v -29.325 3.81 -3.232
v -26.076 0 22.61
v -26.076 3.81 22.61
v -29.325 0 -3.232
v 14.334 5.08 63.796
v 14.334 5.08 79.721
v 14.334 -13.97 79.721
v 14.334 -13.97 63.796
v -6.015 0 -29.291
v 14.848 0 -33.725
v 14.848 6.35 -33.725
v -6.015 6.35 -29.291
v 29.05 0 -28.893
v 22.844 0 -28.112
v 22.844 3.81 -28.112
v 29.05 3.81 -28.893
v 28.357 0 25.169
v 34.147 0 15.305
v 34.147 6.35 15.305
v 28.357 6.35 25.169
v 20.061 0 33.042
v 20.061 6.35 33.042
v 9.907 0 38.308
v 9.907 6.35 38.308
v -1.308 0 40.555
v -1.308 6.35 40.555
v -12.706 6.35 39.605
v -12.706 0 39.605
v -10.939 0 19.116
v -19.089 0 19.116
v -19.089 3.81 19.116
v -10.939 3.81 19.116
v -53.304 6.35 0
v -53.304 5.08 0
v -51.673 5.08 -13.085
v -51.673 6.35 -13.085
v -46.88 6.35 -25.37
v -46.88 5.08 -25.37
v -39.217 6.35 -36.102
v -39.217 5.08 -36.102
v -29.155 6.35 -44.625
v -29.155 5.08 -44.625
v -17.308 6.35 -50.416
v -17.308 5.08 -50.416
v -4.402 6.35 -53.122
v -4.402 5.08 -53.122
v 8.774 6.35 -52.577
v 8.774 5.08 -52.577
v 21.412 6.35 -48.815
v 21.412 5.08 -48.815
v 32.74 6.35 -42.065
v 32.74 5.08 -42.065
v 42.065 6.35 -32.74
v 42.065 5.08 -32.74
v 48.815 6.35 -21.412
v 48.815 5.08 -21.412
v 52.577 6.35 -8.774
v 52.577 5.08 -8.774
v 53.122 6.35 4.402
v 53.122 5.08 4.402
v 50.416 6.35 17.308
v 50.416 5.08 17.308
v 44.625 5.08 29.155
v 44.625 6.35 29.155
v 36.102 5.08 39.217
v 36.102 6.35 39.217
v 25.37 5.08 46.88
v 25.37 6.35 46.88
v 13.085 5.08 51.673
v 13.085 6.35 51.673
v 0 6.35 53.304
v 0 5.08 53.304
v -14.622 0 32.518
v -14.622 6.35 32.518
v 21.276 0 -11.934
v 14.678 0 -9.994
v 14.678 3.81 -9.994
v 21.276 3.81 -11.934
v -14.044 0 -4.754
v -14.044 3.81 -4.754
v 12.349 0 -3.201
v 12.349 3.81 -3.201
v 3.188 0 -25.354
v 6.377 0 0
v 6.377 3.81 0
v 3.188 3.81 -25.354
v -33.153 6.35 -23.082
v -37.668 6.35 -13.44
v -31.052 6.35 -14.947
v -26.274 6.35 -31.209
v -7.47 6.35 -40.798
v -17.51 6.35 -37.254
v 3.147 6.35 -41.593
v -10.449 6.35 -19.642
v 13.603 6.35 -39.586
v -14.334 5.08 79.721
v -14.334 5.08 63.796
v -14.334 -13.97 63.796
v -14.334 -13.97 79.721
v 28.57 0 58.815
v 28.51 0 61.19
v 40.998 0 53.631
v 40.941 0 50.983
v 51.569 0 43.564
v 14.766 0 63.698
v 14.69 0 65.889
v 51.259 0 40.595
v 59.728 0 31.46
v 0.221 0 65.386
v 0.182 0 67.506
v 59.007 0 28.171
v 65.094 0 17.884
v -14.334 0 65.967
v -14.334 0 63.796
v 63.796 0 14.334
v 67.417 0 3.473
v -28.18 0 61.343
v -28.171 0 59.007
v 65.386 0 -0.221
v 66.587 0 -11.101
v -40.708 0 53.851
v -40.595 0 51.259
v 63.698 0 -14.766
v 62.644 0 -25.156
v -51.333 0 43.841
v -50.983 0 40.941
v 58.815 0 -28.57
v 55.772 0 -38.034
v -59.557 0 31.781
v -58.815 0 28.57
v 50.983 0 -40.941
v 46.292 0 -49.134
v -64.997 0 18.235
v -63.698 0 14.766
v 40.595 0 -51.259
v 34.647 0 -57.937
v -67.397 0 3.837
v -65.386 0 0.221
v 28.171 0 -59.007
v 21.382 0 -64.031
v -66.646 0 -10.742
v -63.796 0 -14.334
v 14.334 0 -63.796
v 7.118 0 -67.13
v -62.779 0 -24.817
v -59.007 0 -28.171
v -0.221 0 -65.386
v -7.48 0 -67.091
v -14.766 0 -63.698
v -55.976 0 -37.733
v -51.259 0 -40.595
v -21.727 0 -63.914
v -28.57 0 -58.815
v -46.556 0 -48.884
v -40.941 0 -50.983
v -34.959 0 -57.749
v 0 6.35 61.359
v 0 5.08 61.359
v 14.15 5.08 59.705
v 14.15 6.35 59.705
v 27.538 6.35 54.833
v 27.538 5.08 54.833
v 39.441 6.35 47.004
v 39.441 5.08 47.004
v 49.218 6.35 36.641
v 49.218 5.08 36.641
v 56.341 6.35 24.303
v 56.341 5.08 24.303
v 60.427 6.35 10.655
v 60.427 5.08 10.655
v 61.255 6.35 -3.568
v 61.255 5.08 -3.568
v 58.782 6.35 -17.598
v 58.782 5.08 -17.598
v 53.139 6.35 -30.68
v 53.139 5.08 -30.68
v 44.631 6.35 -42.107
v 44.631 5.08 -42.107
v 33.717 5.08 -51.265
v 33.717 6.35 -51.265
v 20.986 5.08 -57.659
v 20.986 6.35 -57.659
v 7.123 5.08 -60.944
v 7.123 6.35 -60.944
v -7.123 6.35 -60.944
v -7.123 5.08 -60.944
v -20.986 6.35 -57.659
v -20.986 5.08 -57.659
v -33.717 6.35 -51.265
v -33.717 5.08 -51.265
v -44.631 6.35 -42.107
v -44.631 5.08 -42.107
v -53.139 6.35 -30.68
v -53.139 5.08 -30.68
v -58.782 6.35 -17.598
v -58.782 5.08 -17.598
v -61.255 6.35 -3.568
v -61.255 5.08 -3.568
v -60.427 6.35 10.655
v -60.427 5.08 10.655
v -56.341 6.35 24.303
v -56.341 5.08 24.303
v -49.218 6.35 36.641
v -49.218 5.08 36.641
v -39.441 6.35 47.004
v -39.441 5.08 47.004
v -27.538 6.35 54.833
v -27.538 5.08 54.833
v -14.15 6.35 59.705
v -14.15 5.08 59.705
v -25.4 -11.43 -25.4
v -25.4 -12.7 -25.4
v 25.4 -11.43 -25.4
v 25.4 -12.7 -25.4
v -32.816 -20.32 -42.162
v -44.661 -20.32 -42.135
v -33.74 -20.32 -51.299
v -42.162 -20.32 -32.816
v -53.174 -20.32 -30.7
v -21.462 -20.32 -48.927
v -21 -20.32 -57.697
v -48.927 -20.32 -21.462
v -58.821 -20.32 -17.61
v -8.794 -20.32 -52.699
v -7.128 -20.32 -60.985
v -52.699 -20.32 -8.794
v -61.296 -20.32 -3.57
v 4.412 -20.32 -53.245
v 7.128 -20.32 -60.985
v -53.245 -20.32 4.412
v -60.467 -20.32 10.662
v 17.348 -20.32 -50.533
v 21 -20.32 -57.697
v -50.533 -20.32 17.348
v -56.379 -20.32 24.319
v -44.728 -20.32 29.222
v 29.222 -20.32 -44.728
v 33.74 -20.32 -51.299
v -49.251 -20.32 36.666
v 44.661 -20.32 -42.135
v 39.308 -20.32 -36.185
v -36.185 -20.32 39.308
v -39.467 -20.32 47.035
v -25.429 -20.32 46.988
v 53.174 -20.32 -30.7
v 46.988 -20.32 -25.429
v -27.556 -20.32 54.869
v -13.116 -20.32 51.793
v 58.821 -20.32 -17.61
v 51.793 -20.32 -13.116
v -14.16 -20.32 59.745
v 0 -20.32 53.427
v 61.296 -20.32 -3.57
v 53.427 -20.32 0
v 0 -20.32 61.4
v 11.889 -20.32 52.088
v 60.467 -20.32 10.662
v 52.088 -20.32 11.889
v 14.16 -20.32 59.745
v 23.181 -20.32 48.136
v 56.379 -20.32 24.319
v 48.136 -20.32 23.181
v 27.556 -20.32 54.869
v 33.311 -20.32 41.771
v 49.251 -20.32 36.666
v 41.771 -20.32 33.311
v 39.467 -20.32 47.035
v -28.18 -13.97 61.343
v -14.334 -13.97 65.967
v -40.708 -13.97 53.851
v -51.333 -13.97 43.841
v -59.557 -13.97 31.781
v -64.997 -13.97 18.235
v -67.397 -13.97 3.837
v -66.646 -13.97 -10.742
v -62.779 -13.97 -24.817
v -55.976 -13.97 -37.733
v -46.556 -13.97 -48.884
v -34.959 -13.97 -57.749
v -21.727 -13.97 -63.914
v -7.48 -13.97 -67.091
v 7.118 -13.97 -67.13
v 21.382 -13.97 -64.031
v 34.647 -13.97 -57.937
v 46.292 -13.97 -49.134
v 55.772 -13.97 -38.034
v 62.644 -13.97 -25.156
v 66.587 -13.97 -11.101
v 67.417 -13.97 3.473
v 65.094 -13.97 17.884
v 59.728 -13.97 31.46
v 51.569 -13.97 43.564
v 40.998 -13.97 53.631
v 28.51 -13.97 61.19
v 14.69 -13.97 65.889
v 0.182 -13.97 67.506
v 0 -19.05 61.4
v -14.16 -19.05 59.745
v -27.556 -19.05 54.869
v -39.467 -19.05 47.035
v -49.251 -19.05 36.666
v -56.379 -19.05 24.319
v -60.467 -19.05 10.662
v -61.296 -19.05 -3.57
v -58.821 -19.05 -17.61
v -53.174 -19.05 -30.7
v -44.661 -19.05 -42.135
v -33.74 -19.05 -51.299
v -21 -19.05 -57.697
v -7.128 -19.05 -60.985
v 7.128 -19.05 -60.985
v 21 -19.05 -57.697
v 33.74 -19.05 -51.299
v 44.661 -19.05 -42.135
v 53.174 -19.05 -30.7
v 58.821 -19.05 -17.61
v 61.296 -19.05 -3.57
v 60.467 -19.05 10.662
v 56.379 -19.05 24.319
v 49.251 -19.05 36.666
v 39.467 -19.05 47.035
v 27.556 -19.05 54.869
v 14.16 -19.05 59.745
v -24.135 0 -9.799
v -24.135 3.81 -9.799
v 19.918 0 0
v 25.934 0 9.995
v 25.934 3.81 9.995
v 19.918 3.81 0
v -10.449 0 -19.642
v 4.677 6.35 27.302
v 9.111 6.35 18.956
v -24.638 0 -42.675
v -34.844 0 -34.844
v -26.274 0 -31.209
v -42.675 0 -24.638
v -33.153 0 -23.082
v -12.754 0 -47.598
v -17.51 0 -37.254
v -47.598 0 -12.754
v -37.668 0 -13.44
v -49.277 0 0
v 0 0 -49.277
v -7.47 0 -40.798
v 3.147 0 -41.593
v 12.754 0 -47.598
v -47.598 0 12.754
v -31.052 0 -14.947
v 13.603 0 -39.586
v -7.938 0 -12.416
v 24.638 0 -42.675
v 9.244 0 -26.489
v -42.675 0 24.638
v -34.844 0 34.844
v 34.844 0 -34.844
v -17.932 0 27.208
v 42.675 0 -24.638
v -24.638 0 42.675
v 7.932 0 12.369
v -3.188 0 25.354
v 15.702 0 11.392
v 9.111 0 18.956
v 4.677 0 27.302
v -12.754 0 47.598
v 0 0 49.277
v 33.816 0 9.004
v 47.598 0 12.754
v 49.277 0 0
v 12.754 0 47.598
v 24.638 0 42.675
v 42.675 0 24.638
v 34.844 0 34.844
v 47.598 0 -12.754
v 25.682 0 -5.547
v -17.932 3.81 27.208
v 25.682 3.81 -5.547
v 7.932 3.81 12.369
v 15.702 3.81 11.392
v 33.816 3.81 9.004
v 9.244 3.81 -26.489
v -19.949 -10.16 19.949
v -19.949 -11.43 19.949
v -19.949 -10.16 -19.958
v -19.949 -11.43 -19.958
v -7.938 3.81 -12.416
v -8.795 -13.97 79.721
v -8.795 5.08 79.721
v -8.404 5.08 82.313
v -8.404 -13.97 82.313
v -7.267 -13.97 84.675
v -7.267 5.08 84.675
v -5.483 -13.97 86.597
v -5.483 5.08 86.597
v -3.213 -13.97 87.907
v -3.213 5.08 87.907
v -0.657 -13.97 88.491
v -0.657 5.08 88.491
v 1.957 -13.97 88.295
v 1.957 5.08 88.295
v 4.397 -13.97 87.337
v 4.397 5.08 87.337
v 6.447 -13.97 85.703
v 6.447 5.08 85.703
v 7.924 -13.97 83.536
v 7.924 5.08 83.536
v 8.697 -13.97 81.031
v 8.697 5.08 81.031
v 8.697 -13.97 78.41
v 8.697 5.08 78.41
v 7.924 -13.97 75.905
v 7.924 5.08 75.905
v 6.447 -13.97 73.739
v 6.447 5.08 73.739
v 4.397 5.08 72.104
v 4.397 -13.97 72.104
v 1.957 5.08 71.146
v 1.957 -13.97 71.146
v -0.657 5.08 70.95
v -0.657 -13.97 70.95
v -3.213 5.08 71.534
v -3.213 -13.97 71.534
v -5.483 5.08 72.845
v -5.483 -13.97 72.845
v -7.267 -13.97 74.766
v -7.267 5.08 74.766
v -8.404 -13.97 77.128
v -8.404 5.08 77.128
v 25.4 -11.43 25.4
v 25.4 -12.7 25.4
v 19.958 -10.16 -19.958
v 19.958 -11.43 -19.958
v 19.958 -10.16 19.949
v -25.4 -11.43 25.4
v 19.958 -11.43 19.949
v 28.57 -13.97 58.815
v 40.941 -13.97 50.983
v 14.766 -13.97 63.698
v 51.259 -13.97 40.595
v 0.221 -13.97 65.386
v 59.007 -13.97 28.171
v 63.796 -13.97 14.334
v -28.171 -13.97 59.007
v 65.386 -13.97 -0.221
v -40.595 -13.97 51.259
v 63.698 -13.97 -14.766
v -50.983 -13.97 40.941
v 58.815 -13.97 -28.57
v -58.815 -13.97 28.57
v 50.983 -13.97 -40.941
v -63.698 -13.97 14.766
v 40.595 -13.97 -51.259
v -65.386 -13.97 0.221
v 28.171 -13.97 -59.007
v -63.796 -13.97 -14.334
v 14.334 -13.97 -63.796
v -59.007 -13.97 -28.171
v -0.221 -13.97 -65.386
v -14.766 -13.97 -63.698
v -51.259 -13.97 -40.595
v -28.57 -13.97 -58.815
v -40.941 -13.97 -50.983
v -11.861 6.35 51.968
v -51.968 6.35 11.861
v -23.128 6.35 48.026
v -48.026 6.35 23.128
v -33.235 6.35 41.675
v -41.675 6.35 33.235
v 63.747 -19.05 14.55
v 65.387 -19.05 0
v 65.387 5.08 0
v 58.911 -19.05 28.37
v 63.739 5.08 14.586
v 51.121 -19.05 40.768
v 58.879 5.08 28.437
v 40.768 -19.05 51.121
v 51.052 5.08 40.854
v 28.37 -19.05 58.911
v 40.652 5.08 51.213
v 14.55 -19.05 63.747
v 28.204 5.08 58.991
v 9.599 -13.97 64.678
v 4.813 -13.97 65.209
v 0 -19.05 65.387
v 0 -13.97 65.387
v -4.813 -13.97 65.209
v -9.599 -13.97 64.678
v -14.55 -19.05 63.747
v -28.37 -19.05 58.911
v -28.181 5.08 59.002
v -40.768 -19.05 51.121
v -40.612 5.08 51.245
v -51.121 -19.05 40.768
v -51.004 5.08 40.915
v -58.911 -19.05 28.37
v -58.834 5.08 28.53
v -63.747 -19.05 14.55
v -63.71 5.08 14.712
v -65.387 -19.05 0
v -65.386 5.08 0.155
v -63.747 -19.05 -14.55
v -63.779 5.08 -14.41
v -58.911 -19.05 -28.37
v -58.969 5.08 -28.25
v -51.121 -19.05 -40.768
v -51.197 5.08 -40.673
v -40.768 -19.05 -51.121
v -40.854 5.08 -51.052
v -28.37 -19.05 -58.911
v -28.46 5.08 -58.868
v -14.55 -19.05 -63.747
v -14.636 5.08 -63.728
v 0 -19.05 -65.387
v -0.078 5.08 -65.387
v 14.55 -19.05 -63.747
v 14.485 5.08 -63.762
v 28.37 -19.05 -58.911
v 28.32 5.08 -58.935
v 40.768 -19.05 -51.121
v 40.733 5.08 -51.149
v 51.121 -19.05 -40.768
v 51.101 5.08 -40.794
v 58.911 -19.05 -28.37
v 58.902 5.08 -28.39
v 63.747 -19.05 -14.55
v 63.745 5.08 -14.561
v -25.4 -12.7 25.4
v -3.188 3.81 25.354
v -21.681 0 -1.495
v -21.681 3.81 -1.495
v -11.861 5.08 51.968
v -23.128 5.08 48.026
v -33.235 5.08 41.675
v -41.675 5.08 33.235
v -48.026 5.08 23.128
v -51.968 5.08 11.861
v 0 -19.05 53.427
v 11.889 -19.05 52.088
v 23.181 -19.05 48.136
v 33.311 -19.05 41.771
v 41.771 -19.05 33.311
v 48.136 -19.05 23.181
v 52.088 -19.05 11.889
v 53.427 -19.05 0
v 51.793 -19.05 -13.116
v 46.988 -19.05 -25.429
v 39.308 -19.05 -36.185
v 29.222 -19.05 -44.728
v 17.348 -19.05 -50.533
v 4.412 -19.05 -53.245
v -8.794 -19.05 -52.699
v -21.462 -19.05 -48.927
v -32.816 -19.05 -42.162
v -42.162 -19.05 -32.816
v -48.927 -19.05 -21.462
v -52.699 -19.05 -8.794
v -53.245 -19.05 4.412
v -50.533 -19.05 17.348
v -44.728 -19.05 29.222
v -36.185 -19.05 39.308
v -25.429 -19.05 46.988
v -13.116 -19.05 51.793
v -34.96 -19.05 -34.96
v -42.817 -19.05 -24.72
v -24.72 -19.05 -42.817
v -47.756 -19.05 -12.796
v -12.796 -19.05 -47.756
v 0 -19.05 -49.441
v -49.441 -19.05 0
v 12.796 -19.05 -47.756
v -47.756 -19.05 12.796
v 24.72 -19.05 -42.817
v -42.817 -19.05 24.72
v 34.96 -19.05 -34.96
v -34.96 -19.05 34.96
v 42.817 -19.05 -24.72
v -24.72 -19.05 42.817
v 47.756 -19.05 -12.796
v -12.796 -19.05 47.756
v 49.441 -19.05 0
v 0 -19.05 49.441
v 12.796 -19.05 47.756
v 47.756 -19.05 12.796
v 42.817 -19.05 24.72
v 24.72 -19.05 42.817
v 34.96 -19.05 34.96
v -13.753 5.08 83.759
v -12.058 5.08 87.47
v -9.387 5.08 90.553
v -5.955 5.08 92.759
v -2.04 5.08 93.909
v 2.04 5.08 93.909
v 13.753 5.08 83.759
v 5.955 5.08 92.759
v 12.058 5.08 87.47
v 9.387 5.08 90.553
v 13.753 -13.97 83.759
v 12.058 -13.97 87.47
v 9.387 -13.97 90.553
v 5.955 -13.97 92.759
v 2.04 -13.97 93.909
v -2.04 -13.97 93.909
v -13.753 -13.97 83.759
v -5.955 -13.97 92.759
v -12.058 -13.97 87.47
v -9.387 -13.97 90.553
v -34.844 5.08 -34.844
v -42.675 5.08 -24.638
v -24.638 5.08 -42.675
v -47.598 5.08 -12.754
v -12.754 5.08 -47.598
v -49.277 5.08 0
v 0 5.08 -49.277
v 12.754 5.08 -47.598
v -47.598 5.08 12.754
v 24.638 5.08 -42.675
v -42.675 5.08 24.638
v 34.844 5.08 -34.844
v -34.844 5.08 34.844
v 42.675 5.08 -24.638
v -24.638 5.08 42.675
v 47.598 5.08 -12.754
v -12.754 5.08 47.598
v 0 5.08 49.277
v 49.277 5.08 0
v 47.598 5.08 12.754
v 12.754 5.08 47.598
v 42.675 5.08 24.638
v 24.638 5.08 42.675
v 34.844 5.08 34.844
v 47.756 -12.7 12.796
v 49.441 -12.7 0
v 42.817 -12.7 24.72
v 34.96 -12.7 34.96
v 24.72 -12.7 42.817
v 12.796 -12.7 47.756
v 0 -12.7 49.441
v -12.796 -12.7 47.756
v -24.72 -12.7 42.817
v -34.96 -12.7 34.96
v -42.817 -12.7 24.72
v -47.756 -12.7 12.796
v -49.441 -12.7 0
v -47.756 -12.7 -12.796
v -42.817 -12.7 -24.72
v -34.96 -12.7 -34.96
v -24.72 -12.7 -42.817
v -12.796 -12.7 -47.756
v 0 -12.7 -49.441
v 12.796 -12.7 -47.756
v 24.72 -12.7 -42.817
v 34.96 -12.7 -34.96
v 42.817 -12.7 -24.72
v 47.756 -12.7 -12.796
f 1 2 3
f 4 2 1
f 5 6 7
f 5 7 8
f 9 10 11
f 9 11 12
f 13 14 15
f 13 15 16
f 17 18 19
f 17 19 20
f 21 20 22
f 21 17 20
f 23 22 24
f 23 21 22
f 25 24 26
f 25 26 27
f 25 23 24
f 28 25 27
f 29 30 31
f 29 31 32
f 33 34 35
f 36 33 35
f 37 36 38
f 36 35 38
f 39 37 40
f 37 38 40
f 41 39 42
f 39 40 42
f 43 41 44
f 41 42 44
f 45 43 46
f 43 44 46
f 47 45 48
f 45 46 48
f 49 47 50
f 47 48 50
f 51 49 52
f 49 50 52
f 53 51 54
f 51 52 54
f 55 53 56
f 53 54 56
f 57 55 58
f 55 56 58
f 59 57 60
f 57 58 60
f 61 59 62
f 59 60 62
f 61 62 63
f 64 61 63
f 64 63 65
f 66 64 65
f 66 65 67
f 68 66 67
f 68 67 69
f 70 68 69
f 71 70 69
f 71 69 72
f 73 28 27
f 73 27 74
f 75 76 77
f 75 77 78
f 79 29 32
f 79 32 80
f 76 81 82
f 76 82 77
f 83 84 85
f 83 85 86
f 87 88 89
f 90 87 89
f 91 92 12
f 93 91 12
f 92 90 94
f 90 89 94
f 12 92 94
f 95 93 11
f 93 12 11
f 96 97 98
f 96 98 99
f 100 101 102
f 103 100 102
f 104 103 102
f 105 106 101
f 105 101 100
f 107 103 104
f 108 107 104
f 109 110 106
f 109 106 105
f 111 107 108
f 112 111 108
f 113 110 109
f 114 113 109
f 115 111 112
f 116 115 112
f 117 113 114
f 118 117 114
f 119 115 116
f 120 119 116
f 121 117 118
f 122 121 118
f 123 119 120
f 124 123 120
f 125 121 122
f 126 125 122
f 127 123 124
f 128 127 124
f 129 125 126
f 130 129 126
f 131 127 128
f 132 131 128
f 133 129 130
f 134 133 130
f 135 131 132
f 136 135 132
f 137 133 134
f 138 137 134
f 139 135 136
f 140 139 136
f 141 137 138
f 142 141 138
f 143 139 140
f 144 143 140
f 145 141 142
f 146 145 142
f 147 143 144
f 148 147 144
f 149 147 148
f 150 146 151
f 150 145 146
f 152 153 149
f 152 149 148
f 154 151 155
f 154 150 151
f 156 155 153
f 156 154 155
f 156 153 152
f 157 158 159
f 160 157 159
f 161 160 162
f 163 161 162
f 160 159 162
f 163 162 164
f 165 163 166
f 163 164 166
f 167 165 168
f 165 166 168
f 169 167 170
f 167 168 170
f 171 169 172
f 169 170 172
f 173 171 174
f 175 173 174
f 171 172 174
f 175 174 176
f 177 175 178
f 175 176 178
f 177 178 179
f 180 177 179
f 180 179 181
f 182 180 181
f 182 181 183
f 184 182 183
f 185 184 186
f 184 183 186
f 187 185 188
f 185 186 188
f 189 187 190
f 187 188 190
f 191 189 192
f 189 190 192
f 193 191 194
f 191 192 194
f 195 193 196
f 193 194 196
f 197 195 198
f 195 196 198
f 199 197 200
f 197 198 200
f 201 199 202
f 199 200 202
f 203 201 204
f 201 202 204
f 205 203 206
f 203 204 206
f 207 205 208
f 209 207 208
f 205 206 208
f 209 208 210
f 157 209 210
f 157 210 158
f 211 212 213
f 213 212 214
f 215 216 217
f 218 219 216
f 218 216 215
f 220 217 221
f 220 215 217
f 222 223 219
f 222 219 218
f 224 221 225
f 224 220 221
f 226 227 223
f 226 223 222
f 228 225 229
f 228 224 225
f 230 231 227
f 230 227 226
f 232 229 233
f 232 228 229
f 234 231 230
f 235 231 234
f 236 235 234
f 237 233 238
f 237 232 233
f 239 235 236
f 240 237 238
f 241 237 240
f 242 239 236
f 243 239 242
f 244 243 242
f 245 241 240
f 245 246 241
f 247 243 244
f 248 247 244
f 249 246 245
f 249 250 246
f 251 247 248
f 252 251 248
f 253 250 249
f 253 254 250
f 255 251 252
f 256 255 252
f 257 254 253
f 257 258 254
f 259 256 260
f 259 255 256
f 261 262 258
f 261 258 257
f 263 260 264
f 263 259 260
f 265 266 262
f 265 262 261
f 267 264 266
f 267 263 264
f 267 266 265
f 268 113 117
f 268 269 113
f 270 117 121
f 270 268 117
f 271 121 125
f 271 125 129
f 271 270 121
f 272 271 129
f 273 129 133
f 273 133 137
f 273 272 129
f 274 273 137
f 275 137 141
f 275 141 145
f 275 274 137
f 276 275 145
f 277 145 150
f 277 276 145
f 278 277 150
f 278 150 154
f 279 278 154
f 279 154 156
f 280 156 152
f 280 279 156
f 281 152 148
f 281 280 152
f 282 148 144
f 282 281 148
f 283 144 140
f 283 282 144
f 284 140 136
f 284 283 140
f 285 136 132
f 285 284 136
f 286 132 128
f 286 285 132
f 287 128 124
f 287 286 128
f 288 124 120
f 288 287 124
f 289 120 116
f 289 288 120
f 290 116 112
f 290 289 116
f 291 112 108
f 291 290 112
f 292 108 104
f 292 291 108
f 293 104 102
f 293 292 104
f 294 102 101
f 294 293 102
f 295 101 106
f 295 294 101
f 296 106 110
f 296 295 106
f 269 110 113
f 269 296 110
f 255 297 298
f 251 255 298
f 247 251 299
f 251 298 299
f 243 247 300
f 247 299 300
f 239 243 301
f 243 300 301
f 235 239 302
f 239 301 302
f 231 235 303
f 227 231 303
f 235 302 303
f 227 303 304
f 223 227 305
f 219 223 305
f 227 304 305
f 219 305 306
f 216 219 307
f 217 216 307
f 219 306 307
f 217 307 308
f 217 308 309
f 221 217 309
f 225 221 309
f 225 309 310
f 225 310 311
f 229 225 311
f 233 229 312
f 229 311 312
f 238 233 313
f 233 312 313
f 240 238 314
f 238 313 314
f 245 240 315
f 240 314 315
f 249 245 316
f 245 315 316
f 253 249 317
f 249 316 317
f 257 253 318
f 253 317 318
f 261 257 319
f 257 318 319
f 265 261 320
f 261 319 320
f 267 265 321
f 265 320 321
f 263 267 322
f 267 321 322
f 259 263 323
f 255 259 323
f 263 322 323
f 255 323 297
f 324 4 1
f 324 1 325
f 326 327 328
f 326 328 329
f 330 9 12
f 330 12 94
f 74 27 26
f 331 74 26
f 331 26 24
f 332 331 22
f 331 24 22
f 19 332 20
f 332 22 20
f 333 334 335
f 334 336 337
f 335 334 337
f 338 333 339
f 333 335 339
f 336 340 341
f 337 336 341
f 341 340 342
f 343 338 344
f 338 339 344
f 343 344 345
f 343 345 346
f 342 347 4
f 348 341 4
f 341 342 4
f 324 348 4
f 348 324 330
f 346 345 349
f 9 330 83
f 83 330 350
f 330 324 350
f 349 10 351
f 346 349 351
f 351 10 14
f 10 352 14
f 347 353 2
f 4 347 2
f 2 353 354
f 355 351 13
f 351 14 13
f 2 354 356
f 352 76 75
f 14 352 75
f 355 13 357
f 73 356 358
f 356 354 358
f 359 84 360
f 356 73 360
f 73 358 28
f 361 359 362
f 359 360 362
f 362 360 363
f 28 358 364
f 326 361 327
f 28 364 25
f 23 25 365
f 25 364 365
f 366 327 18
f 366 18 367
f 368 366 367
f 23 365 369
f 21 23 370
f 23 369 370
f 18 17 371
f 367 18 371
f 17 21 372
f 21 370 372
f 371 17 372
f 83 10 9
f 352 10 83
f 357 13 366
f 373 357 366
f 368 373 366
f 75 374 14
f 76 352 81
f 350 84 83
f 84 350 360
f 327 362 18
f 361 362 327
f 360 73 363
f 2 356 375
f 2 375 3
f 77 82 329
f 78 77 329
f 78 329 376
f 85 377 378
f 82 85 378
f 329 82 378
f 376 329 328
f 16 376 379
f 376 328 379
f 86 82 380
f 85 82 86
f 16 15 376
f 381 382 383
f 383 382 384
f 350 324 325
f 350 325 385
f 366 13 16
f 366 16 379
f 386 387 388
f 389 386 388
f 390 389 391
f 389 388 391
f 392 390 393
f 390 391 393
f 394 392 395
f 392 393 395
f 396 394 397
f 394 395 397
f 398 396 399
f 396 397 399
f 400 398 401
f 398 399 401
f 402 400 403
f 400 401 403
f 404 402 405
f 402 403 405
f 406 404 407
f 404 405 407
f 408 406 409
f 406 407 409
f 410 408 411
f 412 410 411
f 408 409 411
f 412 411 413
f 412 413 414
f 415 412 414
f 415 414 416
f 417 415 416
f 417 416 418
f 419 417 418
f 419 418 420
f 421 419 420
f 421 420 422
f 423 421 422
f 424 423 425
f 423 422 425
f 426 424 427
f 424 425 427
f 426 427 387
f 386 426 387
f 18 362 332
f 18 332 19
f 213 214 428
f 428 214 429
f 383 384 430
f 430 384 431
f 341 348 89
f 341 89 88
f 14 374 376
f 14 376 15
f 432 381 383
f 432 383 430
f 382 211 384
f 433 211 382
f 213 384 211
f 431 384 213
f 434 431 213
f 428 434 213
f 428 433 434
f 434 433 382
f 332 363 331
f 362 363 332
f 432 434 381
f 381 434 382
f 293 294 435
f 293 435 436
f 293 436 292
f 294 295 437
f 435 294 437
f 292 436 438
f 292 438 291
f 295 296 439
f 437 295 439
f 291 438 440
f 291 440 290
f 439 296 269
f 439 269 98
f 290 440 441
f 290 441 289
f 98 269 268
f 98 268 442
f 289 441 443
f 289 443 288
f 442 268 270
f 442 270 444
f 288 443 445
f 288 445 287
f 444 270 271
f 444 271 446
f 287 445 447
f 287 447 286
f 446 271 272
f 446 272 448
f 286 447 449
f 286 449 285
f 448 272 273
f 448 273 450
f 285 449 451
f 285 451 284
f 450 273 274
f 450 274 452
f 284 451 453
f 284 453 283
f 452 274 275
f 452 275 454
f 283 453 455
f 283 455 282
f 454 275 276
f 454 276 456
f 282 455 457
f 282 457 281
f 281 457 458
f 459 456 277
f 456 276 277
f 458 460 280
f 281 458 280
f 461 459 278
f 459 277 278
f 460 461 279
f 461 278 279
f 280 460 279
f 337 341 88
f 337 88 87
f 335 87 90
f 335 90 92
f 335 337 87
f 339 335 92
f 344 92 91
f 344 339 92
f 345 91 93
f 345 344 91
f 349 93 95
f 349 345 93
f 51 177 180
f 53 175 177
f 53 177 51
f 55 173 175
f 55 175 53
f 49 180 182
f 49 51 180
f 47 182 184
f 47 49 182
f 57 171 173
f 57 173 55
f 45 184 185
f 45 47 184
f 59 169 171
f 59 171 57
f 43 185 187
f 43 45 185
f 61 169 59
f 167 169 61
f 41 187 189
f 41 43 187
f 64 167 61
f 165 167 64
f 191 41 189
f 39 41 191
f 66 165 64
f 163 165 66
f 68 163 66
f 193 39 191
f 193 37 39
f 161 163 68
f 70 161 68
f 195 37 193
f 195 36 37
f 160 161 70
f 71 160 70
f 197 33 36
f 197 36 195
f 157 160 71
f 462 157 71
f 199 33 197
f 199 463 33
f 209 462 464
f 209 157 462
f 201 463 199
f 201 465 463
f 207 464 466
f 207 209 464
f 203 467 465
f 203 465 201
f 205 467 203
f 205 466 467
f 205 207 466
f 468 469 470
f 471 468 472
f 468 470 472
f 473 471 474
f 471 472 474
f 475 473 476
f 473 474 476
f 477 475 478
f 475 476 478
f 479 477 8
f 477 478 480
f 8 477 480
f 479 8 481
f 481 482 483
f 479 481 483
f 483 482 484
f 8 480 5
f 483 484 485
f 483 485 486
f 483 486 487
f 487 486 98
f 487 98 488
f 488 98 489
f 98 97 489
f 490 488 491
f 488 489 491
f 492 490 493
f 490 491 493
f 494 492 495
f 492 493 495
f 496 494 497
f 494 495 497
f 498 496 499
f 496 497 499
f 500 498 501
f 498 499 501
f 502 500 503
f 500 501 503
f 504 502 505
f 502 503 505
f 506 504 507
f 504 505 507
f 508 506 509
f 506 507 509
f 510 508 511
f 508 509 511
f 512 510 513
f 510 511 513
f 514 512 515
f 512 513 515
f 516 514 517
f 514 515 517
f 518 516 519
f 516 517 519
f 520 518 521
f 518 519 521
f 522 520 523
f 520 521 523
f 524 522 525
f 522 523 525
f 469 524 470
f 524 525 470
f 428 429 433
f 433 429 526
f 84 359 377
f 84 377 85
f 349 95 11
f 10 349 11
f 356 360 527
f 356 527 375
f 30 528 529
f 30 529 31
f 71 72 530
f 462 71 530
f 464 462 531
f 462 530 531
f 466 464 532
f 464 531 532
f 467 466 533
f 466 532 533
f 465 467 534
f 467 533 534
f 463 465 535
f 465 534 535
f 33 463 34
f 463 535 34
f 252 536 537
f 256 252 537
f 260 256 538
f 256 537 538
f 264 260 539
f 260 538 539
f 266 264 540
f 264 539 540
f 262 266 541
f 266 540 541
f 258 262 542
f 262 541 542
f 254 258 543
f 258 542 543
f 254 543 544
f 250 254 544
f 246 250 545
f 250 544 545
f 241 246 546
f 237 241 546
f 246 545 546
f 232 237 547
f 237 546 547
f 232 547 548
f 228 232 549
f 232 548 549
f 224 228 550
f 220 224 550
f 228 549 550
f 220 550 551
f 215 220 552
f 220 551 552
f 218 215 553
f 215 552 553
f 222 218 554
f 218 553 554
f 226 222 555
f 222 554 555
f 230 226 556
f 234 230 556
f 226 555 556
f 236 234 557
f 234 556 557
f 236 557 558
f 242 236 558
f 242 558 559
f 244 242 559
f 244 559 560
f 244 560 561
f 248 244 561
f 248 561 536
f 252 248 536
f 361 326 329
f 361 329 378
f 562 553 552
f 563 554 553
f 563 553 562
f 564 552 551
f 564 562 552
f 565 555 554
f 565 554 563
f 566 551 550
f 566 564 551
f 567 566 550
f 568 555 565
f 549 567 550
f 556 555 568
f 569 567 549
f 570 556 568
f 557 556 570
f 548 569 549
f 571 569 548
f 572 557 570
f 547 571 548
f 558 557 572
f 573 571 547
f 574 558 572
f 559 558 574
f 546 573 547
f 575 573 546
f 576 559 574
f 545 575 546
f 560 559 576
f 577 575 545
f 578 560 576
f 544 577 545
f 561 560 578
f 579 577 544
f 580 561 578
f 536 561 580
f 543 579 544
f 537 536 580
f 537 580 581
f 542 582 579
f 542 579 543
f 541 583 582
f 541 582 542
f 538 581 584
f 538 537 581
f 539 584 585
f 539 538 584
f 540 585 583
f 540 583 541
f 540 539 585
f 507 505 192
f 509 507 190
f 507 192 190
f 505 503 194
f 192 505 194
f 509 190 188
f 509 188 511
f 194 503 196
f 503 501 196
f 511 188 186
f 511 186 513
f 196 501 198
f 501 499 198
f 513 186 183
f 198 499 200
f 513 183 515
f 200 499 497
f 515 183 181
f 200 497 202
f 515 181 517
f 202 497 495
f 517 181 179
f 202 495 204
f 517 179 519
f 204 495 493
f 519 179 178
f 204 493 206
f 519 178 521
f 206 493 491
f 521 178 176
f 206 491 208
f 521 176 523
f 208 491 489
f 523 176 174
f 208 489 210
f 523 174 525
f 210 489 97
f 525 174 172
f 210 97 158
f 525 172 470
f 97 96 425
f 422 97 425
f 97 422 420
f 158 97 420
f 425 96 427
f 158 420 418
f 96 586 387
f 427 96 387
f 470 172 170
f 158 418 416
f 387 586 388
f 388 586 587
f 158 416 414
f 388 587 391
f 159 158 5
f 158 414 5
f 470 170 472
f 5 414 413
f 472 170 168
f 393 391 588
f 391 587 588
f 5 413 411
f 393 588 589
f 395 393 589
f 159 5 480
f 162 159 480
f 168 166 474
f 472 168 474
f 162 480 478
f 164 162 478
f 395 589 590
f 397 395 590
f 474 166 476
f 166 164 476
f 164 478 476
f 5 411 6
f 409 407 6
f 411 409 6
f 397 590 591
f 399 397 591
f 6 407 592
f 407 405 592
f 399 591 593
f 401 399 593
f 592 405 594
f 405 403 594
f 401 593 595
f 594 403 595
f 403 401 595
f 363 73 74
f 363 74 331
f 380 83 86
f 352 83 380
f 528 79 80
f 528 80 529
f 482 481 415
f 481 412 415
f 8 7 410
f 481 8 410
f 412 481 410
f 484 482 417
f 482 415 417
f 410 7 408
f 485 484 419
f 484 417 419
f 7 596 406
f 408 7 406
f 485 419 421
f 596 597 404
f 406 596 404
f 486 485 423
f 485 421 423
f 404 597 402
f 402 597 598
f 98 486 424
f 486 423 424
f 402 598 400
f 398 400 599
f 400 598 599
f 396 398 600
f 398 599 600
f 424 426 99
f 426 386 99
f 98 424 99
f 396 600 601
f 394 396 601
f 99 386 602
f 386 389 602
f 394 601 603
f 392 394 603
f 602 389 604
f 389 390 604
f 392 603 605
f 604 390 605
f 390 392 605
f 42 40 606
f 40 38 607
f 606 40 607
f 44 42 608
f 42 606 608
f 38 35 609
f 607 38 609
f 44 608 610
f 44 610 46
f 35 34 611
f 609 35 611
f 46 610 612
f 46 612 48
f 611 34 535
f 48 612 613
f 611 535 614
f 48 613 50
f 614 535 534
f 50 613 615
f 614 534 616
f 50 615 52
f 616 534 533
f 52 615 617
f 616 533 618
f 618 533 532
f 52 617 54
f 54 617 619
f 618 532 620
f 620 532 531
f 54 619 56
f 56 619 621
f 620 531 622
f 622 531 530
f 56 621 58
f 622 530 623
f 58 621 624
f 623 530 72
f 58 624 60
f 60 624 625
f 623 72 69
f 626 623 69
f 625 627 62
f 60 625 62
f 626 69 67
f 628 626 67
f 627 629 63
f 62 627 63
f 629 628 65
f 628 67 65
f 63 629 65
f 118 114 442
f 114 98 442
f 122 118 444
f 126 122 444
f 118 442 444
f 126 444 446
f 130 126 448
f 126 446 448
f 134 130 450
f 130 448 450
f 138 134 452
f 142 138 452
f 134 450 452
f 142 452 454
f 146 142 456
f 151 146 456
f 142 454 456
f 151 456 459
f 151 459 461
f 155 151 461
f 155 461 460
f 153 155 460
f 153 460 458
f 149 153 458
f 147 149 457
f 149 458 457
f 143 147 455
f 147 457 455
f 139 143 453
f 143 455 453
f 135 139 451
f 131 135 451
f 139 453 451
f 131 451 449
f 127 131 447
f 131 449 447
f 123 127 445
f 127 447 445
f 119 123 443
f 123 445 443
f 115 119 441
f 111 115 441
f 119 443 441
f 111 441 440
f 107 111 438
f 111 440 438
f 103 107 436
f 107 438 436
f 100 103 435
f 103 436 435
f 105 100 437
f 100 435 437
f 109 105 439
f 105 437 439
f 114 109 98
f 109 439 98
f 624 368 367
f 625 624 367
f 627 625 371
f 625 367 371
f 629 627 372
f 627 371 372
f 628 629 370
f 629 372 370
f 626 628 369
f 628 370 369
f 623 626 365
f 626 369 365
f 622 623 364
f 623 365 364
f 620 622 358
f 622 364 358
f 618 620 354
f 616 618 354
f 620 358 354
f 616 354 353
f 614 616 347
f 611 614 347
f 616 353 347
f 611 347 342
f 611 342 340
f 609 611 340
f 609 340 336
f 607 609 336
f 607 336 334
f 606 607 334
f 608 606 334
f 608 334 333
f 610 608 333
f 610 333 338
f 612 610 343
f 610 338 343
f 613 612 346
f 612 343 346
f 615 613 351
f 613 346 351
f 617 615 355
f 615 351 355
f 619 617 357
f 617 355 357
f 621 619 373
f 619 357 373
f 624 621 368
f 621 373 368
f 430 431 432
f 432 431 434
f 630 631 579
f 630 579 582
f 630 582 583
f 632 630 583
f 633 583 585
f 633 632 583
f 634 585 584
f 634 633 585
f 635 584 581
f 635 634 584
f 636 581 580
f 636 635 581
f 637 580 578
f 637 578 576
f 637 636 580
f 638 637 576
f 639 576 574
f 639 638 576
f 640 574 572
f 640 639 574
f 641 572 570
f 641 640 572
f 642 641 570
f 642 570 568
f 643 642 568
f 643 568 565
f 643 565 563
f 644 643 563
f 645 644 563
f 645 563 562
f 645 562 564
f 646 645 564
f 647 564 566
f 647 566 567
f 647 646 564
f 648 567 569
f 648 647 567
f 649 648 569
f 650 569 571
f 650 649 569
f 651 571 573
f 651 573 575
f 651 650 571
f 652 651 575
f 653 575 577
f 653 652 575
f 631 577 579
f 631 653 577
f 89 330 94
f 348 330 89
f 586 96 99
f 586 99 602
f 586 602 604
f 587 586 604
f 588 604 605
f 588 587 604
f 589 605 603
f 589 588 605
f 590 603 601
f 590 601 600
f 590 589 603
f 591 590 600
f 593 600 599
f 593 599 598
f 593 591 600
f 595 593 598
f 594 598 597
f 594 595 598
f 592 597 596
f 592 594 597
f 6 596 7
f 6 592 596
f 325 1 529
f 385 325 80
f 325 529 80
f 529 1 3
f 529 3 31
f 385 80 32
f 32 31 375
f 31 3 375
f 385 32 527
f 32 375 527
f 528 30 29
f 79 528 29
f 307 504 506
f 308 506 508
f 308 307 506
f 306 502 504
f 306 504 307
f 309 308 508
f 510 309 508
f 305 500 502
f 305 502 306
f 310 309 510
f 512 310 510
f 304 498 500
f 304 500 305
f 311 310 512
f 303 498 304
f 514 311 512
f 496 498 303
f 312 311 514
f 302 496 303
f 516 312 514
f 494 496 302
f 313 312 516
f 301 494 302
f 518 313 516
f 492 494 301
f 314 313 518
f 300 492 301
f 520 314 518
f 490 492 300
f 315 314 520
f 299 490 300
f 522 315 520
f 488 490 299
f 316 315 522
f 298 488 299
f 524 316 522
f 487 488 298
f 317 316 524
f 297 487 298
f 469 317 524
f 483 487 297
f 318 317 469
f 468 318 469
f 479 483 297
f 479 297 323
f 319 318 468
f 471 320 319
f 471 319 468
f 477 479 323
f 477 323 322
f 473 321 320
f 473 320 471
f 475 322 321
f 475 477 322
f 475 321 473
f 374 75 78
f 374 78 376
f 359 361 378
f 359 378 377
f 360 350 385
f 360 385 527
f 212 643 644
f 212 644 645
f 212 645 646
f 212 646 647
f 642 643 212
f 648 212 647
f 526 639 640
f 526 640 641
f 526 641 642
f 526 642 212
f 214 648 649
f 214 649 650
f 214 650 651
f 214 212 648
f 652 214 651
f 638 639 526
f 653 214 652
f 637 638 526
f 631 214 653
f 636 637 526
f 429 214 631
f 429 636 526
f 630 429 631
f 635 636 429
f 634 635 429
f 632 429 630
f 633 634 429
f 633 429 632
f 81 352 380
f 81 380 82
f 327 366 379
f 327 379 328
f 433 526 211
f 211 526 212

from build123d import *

# Parameters (mm, degrees)
F0_R      = 65.3866528966
F0_R_2    = 49.276969373
F1_DEPTH  = 12.7
F2_DEPTH  = 5.08
F3_R      = 65.3866528966
F3_R_2    = 49.4409677946
F4_DEPTH  = 6.35
F6_DEPTH  = 1.27
F8_DEPTH  = 1.27
F10_DEPTH = 3.81
F11_W     = 6.35
F11_H     = 6.35
F11_W_2   = 12.7
F11_H_2   = 12.7
F12_DEPTH = 1.27
F14_DEPTH = 1.27
F16_DEPTH = 6.35
F17_R     = 8.7947542669
F18_DEPTH = 19.05
F19_W     = 13.97
F19_H     = 2.1709432293


with BuildPart() as f1:
    # F0 (on Front) → F1 (new body)
    with BuildSketch(Plane.XZ):
        Circle(F0_R)
        Circle(F0_R_2, mode=Mode.SUBTRACT)
        Circle(F0_R_2)
    extrude(amount=F1_DEPTH)

    # F0 (on Front) → F2 (join)
    with BuildSketch(Plane.XZ):
        Circle(F0_R)
        Circle(F0_R_2, mode=Mode.SUBTRACT)
    extrude(amount=-F2_DEPTH)

    # F3 (on face) → F4 (join)
    with BuildSketch(Plane.XZ.offset(12.7)):
        Circle(F3_R)
        Circle(F3_R_2, mode=Mode.SUBTRACT)
    extrude(amount=F4_DEPTH)

    # F5 (on face) → F6 (join)
    with BuildSketch(Plane.XZ.offset(19.05)):
        with BuildLine():
            ThreePointArc((61.4002316211, 0), (43.4165201457, 43.4165201457), (0, 61.4002316211))
            ThreePointArc((0, 61.4002316211), (-43.4165201457, -43.4165201457), (61.4002316211, 0))
        make_face()
        with BuildLine():
            ThreePointArc((53.4273890701, 0), (-37.7788691126, -37.7788691126), (0, 53.4273890701))
            ThreePointArc((0, 53.4273890701), (37.7788691126, 37.7788691126), (53.4273890701, 0))
        make_face(mode=Mode.SUBTRACT)
    extrude(amount=F6_DEPTH)

    # F7 (on face) → F8 (join)
    with BuildSketch(Plane(origin=(0, 5.08, 0), x_dir=(-1, 0, 0), z_dir=(0, 1, 0))):
        with BuildLine():
            ThreePointArc((61.3592320157, 0), (43.3875290467, 43.3875290467), (0, 61.3592320157))
            ThreePointArc((0, 61.3592320157), (-43.3875290467, -43.3875290467), (61.3592320157, 0))
        make_face()
        with BuildLine():
            ThreePointArc((53.3043902539, 0), (-37.6918958156, -37.6918958156), (0, 53.3043902539))
            ThreePointArc((0, 53.3043902539), (37.6918958156, 37.6918958156), (53.3043902539, 0))
        make_face(mode=Mode.SUBTRACT)
    extrude(amount=F8_DEPTH)

    # F9 (on face) → F10 (join)
    with BuildSketch(Plane.XZ):
        Polygon((7.9319217403, 12.3692400979), (6.3765081577, 0), (3.1882540789, -25.35421215), (9.2441895977, -26.4890752733), (12.3492386192, -3.2012101728), (14.6780256182, -9.9935047328), (21.2762542069, -11.9341602549), (25.6818294937, -5.5471150812), (22.8443143439, -28.1121175272), (29.0504059829, -28.8925242251), (33.8158489017, 9.0040949788), (25.9338282049, 9.9952472374), (19.9177954346, 0), (15.7019969323, 11.3921648183), align=None)
        Polygon((-7.9377657239, -12.415706271), (-6.376509089, 0), (-3.1882545445, 25.35421215), (-17.9323829615, 27.2082644137), (-26.0757394135, 22.609507665), (-29.3252519459, -3.2318512921), (-24.1350829601, -9.7994385287), align=None)
        Polygon((-19.0893802792, 19.1163290292), (-10.9386276454, 19.1163290292), (-14.0436757356, -4.7537344508), (-21.6811935348, -1.4947552551), align=None, mode=Mode.SUBTRACT)
    extrude(amount=-F10_DEPTH)

    # F11 (on face) → F12 (cut)
    with BuildSketch(Plane.XZ.offset(12.7)):
        Polygon((-25.4, 12.7), (-19.05, 12.7), (-19.05, 19.05), (-12.7, 19.05), (-12.7, 25.4), (-25.4, 25.4), align=None)
        with Locations((-15.875, 15.875)):
            Rectangle(F11_W, F11_H)
        with Locations((6.35, 15.875)):
            Rectangle(F11_W_2, F11_H)
        with Locations((6.35, 22.225)):
            Rectangle(F11_W_2, F11_H)
        with Locations((-6.35, 22.225)):
            Rectangle(F11_W_2, F11_H)
        with Locations((-6.35, 15.875)):
            Rectangle(F11_W_2, F11_H)
        with Locations((-6.35, 6.35)):
            Rectangle(F11_W_2, F11_H_2)
        with Locations((-15.875, 6.35)):
            Rectangle(F11_W, F11_H_2)
        with Locations((-22.225, 6.35)):
            Rectangle(F11_W, F11_H_2)
        with Locations((-22.225, -6.35)):
            Rectangle(F11_W, F11_H_2)
        with Locations((-15.875, -6.35)):
            Rectangle(F11_W, F11_H_2)
        with Locations((-6.35, -6.35)):
            Rectangle(F11_W_2, F11_H_2)
        with Locations((6.35, -6.35)):
            Rectangle(F11_W_2, F11_H_2)
        with Locations((6.35, 6.35)):
            Rectangle(F11_W_2, F11_H_2)
        with Locations((15.875, 6.35)):
            Rectangle(F11_W, F11_H_2)
        with Locations((22.225, 6.35)):
            Rectangle(F11_W, F11_H_2)
        Polygon((12.7, 25.4), (12.7, 19.05), (19.05, 19.05), (19.05, 12.7), (25.4, 12.7), (25.4, 25.4), align=None)
        with Locations((15.875, 15.875)):
            Rectangle(F11_W, F11_H)
        with Locations((15.875, -6.35)):
            Rectangle(F11_W, F11_H_2)
        with Locations((22.225, -6.35)):
            Rectangle(F11_W, F11_H_2)
        with Locations((15.875, -15.875)):
            Rectangle(F11_W, F11_H)
        with Locations((6.35, -15.875)):
            Rectangle(F11_W_2, F11_H)
        with Locations((-6.35, -15.875)):
            Rectangle(F11_W_2, F11_H)
        with Locations((-15.875, -15.875)):
            Rectangle(F11_W, F11_H)
        Polygon((-19.05, -19.05), (-19.05, -12.7), (-25.4, -12.7), (-25.4, -25.4), (-12.7, -25.4), (-12.7, -19.05), align=None)
        with Locations((-6.35, -22.225)):
            Rectangle(F11_W_2, F11_H)
        with Locations((6.35, -22.225)):
            Rectangle(F11_W_2, F11_H)
        Polygon((25.4, -12.7), (19.05, -12.7), (19.05, -19.05), (12.7, -19.05), (12.7, -25.4), (25.4, -25.4), align=None)
    extrude(amount=-F12_DEPTH, mode=Mode.SUBTRACT)

    # F13 (on face) → F14 (cut)
    with BuildSketch(Plane.XZ.offset(11.43)):
        Polygon((19.9583778158, 19.9491092935), (-19.9491092935, 19.9491092935), (19.9583778158, -19.9583778158), align=None)
        Polygon((19.9583778158, -19.9583778158), (-19.9491092935, 19.9491092935), (-19.9491092935, -19.9583778158), align=None)
    extrude(amount=-F14_DEPTH, mode=Mode.SUBTRACT)

    # F15 (on face) → F16 (join)
    with BuildSketch(Plane.XZ):
        with BuildLine():
            Line((9.1108540073, 18.9562831074), (34.1474637389, 15.3051111847))
            ThreePointArc((34.1474637389, 15.3051111847), (15.1689291883, 36.0320480212), (-12.7061712908, 39.6054858053))
            Line((-12.7061712908, 39.6054858053), (-14.6217672154, 32.5177796185))
            Line((-14.6217672154, 32.5177796185), (4.6772868372, 27.301819995))
            Line((4.6772868372, 27.301819995), (9.1108540073, 18.9562831074))
        make_face()
        with BuildLine():
            Line((-10.4489978403, -19.6418240666), (-31.0520436615, -14.947460033))
            Line((-31.0520436615, -14.947460033), (-37.6676143577, -13.4401150798))
            ThreePointArc((-37.6676143577, -13.4401150798), (-17.5097623108, -37.2539959677), (13.6029810031, -39.585760444))
            Line((13.6029810031, -39.585760444), (14.8484101519, -33.7249152362))
            Line((14.8484101519, -33.7249152362), (-6.0154320672, -29.2913503945))
            Line((-6.0154320672, -29.2913503945), (-10.4489978403, -19.6418240666))
        make_face()
    extrude(amount=-F16_DEPTH)

    # F17 (on face) → F18 (join)
    with BuildSketch(Plane(origin=(0, 5.08, 0), x_dir=(-1, 0, 0), z_dir=(0, 1, 0))):
        with BuildLine():
            ThreePointArc((1.22e-08, 65.3866528966), (10.1356111467, 69.5849604991), (14.3339187405, 79.7205716372))
            ThreePointArc((14.3339187405, 79.7205716372), (0, 94.0544903777), (-14.3339187405, 79.7205716372))
            ThreePointArc((-14.3339187405, 79.7205716372), (-10.1356111381, 69.5849604904), (1.22e-08, 65.3866528966))
        make_face()
        with Locations((0, 79.7205716372)):
            Circle(F17_R, mode=Mode.SUBTRACT)
        with BuildLine():
            Line((14.3339187405, 63.7961844514), (14.3339187405, 79.7205716372))
            ThreePointArc((14.3339187405, 79.7205716372), (10.1356111467, 69.5849604991), (1.22e-08, 65.3866528966))
            ThreePointArc((1.22e-08, 65.3866528966), (7.2109433621, 64.9878194191), (14.3339187405, 63.7961844514))
        make_face()
        with BuildLine():
            ThreePointArc((1.22e-08, 65.3866528966), (-10.1356111381, 69.5849604904), (-14.3339187405, 79.7205716372))
            Line((-14.3339187405, 79.7205716372), (-14.3339187405, 63.7961844514))
            ThreePointArc((-14.3339187405, 63.7961844514), (-7.21094335, 64.9878194204), (1.22e-08, 65.3866528966))
        make_face()
    extrude(amount=-F18_DEPTH)


with BuildPart() as f20:
    # F19 (on face) → F20 (revolve)
    with BuildSketch(Plane(origin=(-14.3339187405, 0, 0), x_dir=(0, -1, 0), z_dir=(-1, 0, 0))):
        with Locations((6.985, 64.8816560661)):
            Rectangle(F19_W, F19_H)
    revolve(axis=Axis((0, 6.35, 0), (0, -1, 0)))


solid = Compound([f1.part, f20.part])
